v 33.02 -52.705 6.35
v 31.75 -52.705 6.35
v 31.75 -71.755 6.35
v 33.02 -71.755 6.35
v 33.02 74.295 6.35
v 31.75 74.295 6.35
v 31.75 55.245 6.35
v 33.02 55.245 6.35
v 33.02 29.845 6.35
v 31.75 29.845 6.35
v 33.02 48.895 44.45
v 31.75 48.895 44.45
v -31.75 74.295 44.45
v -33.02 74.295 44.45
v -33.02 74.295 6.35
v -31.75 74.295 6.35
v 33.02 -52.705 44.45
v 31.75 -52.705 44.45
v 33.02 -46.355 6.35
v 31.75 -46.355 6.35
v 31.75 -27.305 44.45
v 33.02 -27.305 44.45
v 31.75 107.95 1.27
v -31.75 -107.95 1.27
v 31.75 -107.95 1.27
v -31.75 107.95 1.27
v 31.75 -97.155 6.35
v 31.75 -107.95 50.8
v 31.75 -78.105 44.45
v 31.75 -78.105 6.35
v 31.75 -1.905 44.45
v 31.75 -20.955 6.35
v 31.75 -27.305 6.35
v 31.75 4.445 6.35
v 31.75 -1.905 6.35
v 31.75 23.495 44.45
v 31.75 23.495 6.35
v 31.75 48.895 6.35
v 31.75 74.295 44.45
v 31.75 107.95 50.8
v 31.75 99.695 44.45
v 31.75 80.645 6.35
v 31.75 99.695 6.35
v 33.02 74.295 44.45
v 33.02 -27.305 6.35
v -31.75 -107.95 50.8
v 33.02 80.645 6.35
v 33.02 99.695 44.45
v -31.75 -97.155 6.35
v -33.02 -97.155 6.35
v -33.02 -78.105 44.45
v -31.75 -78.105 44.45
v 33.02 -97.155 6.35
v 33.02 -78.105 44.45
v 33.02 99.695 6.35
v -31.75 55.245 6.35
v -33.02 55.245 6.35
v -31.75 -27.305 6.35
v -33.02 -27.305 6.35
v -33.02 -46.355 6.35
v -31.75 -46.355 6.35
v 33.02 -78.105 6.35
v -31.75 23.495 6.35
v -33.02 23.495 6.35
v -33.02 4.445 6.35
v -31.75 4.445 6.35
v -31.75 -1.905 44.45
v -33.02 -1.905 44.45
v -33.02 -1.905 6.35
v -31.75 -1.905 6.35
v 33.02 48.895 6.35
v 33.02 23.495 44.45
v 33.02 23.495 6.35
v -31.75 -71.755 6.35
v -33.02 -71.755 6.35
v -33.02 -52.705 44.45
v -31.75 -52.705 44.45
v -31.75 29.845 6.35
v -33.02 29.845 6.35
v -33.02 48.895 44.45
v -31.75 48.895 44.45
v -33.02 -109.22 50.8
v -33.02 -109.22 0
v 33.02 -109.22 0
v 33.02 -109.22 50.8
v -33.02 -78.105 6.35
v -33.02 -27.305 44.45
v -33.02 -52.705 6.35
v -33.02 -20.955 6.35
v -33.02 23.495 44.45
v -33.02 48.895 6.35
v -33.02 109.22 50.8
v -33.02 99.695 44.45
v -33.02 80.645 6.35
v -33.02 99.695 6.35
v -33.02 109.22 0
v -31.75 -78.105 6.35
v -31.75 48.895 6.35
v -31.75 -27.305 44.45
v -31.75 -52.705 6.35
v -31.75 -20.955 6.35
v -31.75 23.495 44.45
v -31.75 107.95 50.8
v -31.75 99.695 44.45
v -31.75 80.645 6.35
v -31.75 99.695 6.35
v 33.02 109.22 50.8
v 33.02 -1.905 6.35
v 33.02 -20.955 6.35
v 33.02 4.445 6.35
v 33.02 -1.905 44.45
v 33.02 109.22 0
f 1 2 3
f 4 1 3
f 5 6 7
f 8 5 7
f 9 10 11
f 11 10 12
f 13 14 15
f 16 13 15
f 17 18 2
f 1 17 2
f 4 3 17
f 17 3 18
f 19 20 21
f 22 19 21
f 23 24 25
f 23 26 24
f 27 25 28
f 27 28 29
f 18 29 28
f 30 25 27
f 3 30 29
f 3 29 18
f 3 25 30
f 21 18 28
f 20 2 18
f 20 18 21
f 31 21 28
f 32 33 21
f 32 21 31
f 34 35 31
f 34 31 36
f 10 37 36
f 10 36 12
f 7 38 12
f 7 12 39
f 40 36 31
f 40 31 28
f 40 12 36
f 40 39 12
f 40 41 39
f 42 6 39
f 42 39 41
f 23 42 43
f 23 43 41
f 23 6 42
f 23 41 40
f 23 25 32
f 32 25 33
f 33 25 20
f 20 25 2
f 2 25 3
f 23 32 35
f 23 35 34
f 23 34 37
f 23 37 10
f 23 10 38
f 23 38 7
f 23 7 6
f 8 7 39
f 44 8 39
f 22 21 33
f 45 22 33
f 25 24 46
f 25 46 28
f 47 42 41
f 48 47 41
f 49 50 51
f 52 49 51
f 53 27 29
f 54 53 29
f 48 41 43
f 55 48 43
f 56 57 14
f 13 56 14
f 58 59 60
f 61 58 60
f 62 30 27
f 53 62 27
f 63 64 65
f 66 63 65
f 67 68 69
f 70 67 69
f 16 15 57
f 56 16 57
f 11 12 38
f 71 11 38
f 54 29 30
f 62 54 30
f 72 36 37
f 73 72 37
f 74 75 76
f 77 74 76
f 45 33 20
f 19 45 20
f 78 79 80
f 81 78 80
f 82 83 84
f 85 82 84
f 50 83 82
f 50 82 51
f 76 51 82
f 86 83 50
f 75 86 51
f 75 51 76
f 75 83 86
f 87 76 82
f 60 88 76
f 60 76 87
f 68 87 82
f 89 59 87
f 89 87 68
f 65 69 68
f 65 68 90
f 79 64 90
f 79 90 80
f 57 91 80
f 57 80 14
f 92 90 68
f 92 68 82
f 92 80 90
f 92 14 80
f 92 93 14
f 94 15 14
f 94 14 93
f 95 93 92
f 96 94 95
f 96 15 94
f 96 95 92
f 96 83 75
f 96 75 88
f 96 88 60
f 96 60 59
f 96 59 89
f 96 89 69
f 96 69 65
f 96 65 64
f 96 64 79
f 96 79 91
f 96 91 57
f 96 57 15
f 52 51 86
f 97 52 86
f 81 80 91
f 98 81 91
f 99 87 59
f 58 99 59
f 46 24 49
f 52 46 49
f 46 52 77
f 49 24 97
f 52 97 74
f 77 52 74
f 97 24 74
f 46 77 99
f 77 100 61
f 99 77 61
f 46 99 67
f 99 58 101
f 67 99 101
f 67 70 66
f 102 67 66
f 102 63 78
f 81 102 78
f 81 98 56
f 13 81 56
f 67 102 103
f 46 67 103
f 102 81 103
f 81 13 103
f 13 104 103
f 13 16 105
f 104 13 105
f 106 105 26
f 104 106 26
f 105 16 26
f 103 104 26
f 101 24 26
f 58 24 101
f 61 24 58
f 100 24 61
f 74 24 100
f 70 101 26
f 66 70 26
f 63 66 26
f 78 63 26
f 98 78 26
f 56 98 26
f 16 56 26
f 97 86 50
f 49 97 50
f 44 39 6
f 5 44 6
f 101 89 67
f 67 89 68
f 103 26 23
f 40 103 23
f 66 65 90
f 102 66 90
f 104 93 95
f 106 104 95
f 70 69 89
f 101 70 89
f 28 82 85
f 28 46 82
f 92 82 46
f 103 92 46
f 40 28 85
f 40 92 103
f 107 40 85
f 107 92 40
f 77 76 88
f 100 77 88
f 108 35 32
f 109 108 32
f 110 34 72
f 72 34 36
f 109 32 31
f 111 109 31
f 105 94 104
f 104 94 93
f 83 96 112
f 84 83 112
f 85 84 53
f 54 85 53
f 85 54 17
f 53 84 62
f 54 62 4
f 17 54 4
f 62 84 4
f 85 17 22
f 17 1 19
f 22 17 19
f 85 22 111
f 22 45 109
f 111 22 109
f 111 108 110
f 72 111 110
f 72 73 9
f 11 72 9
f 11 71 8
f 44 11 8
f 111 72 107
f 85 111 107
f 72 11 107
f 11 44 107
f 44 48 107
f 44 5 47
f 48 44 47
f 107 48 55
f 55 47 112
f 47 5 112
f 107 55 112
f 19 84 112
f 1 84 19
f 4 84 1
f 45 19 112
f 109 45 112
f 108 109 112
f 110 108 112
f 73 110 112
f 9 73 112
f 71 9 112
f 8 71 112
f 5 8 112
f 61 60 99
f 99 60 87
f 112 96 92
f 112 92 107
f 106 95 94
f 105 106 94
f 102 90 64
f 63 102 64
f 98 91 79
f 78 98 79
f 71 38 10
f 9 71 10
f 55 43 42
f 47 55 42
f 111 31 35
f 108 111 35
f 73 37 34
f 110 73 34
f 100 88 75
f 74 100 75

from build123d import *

# Parameters (mm, degrees)
F0_W     = 66.04
F0_H     = 218.44
F0_W_2   = 63.5
F0_H_2   = 215.9
F1_DEPTH = 1.27
F2_DEPTH = 50.8
F4_DEPTH = 76.2


with BuildPart() as f1:
    # F0 (on Top) → F1 (new body)
    with BuildSketch(Plane.XY):
        Rectangle(F0_W, F0_H)
        Rectangle(F0_W_2, F0_H_2, mode=Mode.SUBTRACT)
        Rectangle(F0_W_2, F0_H_2)
    extrude(amount=F1_DEPTH)

    # F0 (on Top) → F2 (join)
    with BuildSketch(Plane.XY):
        Rectangle(F0_W, F0_H)
        Rectangle(F0_W_2, F0_H_2, mode=Mode.SUBTRACT)
    extrude(amount=F2_DEPTH)

    # F3 (on face) → F4 (cut)
    with BuildSketch(Plane(origin=(-33.02, 0, 0), x_dir=(0, -1, 0), z_dir=(-1, 0, 0))):
        Polygon((-80.645, 6.35), (-99.695, 44.45), (-99.695, 6.35), align=None)
        Polygon((-74.295, 6.35), (-55.245, 6.35), (-74.295, 44.45), align=None)
        Polygon((-48.895, 6.35), (-29.845, 6.35), (-48.895, 44.45), align=None)
        Polygon((-23.495, 6.35), (-4.445, 6.35), (-23.495, 44.45), align=None)
        Polygon((1.905, 6.35), (20.955, 6.35), (1.905, 44.45), align=None)
        Polygon((27.305, 6.35), (46.355, 6.35), (27.305, 44.45), align=None)
        Polygon((52.705, 6.35), (71.755, 6.35), (52.705, 44.45), align=None)
        Polygon((78.105, 6.35), (97.155, 6.35), (78.105, 44.45), align=None)
    extrude(amount=-F4_DEPTH, mode=Mode.SUBTRACT)


solid = f1.part
